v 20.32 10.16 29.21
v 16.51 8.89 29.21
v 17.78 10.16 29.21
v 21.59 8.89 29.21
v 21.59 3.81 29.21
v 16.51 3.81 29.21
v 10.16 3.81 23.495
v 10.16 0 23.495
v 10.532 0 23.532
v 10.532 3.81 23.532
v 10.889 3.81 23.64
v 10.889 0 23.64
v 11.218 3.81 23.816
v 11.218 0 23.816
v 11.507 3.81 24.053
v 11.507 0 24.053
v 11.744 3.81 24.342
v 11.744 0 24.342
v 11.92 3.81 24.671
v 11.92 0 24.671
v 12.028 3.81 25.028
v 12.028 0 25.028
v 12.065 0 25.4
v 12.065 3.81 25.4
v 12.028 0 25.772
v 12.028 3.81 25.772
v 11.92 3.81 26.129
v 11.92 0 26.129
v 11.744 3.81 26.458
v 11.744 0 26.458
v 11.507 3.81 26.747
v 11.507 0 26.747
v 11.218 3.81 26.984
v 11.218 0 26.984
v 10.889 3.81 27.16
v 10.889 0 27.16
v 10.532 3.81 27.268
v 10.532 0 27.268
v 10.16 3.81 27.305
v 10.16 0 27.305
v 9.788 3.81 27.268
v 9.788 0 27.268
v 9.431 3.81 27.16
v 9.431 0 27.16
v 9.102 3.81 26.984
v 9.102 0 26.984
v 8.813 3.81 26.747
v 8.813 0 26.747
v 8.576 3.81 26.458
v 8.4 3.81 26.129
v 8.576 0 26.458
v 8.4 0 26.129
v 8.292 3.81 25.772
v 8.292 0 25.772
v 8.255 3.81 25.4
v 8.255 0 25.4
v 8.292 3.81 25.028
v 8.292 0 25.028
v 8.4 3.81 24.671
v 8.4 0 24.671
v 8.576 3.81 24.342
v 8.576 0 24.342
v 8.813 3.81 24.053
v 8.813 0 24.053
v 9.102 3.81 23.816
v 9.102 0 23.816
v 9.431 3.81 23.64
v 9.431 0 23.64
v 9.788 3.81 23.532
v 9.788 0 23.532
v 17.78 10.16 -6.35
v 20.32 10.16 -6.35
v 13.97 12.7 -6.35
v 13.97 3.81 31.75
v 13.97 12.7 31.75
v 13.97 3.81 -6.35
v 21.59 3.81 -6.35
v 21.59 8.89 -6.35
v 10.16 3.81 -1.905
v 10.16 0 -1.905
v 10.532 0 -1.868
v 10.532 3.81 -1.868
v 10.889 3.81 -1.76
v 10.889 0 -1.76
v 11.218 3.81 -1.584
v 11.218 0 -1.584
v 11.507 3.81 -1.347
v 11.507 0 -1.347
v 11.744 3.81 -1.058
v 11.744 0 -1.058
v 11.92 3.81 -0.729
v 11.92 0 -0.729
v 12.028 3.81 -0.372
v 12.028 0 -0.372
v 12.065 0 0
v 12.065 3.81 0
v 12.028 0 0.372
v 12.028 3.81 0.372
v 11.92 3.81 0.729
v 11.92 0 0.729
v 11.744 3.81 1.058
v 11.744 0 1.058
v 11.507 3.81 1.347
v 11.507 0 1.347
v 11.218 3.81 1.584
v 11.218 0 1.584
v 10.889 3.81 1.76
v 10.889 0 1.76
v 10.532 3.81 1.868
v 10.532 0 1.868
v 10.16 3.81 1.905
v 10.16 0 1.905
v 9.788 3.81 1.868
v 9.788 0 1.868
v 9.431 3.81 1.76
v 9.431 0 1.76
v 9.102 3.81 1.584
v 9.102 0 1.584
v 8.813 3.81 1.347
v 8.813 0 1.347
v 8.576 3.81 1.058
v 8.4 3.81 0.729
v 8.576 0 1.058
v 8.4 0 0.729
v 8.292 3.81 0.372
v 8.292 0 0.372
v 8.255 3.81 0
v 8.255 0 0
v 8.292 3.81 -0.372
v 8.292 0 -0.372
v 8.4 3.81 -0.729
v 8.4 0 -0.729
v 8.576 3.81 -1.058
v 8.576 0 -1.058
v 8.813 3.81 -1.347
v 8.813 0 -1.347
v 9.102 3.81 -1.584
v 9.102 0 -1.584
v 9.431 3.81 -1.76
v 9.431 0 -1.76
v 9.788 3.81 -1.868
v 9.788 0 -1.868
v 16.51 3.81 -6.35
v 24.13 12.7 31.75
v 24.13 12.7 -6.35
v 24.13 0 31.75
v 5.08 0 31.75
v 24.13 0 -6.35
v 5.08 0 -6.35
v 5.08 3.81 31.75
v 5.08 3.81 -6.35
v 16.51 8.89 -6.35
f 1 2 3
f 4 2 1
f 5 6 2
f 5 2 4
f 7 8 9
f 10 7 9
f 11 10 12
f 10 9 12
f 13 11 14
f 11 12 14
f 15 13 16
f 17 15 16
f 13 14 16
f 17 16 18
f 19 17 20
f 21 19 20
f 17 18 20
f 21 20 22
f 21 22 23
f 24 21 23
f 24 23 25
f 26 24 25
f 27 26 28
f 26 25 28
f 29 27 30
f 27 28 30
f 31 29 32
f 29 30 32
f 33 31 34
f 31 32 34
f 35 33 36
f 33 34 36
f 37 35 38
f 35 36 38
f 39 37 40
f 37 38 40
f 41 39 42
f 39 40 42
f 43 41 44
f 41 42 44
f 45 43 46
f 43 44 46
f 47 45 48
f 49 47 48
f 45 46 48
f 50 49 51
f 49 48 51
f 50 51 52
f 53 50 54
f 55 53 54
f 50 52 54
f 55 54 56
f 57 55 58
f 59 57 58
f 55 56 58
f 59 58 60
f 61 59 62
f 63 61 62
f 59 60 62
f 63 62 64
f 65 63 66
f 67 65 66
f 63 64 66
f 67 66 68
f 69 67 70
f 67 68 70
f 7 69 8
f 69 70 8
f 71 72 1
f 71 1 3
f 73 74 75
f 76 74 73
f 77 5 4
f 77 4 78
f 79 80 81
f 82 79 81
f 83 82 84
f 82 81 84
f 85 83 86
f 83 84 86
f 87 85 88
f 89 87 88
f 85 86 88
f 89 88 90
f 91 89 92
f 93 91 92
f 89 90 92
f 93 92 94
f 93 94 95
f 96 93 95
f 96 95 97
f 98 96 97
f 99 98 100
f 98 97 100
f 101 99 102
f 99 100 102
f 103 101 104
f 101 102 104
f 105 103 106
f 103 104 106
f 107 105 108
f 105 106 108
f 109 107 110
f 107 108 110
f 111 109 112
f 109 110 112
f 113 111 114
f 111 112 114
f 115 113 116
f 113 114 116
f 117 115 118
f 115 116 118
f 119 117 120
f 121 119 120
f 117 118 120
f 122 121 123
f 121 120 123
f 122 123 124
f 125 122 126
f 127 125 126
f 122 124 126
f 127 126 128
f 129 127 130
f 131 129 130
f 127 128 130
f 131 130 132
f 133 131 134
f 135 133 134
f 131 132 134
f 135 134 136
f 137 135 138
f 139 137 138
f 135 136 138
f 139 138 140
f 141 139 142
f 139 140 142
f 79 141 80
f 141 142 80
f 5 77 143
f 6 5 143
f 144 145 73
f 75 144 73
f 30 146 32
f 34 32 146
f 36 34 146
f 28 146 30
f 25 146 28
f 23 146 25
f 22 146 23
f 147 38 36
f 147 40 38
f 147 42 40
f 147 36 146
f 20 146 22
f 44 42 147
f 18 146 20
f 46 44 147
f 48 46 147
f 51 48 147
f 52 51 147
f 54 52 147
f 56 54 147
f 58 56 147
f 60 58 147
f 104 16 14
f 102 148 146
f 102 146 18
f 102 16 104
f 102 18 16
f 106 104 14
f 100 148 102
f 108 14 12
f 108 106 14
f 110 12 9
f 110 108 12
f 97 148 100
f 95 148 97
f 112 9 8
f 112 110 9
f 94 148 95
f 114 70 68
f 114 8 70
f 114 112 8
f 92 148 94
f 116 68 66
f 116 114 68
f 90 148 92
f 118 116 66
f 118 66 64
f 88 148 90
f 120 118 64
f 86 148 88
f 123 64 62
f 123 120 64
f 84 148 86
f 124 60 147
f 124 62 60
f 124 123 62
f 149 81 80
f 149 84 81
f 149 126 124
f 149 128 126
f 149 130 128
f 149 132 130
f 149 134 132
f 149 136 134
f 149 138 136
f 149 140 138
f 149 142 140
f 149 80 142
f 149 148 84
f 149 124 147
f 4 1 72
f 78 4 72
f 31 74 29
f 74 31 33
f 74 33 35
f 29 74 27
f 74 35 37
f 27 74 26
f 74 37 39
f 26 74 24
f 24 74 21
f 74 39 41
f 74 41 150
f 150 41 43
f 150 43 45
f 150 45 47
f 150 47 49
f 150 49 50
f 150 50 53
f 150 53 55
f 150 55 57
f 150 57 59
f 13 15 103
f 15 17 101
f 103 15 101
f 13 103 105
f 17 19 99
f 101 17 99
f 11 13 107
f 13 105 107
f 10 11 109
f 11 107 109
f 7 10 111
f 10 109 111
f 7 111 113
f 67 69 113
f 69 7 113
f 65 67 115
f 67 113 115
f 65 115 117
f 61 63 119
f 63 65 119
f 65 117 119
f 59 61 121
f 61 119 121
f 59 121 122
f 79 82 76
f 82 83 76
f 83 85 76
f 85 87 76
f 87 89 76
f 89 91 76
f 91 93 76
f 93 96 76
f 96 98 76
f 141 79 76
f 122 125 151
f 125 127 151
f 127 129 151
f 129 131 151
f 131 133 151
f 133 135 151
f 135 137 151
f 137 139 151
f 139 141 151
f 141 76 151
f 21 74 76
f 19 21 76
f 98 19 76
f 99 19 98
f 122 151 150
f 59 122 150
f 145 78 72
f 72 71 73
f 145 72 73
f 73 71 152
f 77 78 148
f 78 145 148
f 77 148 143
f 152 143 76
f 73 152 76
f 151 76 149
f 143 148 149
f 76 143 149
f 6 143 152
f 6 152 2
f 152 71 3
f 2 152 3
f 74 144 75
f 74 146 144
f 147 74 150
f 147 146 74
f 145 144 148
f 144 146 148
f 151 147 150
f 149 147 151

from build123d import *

# Parameters (mm, degrees)
SKETCH1_W           = 19.05
SKETCH1_H           = 38.1
SKETCH1_R           = 1.905
BOSS_EXTRUDE1_DEPTH = 3.81
BOSS_EXTRUDE2_DEPTH = 6.35
SKETCH3_W           = 10.16
SKETCH3_H           = 38.1
BOSS_EXTRUDE3_DEPTH = 2.54
CHAMFER1_SIZE       = 1.27


with BuildPart() as part:
    # Sketch1 → Boss-Extrude1 (new body)
    with BuildSketch(Plane(origin=(0, 0, 0), x_dir=(1, 0, 0), z_dir=(0, 1, 0))):
        with Locations((-4.445, -12.7)):
            Rectangle(SKETCH1_W, SKETCH1_H)
        with Locations(Location((0, 0, 0), (0, 0, 90))):
            Circle(SKETCH1_R, mode=Mode.SUBTRACT)
        with Locations(Location((0, -25.4, 0), (0, 0, 90))):
            Circle(SKETCH1_R, mode=Mode.SUBTRACT)
    extrude(amount=BOSS_EXTRUDE1_DEPTH)

    # Sketch2 → Boss-Extrude2 (add)
    with BuildSketch(Plane(origin=(0, 3.81, 0), x_dir=(1, 0, 0), z_dir=(0, 1, 0))):
        Polygon((-13.97, 6.35), (-13.97, -31.75), (-3.81, -31.75), (-3.81, 6.35), (-6.35, 6.35), (-6.35, -29.21), (-11.43, -29.21), (-11.43, 6.35), align=None)
    extrude(amount=BOSS_EXTRUDE2_DEPTH)

    # Sketch3 → Boss-Extrude3 (add)
    with BuildSketch(Plane(origin=(0, 10.16, 0), x_dir=(1, 0, 0), z_dir=(0, 1, 0))):
        with Locations((-8.89, -12.7)):
            Rectangle(SKETCH3_W, SKETCH3_H)
    extrude(amount=BOSS_EXTRUDE3_DEPTH)

    # Chamfer1
    chamfer1_edges = [part.edges().sort_by_distance(p)[0] for p in [
        (-6.35, 10.16, 11.43),
        (-11.43, 10.16, 11.43),
    ]]
    chamfer(chamfer1_edges, length=CHAMFER1_SIZE)


with BuildPart() as body_2:
    # Mirror1: mirrored copy
    add(part.part.mirror(Plane(origin=(5.08, 3.81, -6.35), x_dir=(0, 0, 1), z_dir=(-1, 0, 0))))


solid = body_2.part
